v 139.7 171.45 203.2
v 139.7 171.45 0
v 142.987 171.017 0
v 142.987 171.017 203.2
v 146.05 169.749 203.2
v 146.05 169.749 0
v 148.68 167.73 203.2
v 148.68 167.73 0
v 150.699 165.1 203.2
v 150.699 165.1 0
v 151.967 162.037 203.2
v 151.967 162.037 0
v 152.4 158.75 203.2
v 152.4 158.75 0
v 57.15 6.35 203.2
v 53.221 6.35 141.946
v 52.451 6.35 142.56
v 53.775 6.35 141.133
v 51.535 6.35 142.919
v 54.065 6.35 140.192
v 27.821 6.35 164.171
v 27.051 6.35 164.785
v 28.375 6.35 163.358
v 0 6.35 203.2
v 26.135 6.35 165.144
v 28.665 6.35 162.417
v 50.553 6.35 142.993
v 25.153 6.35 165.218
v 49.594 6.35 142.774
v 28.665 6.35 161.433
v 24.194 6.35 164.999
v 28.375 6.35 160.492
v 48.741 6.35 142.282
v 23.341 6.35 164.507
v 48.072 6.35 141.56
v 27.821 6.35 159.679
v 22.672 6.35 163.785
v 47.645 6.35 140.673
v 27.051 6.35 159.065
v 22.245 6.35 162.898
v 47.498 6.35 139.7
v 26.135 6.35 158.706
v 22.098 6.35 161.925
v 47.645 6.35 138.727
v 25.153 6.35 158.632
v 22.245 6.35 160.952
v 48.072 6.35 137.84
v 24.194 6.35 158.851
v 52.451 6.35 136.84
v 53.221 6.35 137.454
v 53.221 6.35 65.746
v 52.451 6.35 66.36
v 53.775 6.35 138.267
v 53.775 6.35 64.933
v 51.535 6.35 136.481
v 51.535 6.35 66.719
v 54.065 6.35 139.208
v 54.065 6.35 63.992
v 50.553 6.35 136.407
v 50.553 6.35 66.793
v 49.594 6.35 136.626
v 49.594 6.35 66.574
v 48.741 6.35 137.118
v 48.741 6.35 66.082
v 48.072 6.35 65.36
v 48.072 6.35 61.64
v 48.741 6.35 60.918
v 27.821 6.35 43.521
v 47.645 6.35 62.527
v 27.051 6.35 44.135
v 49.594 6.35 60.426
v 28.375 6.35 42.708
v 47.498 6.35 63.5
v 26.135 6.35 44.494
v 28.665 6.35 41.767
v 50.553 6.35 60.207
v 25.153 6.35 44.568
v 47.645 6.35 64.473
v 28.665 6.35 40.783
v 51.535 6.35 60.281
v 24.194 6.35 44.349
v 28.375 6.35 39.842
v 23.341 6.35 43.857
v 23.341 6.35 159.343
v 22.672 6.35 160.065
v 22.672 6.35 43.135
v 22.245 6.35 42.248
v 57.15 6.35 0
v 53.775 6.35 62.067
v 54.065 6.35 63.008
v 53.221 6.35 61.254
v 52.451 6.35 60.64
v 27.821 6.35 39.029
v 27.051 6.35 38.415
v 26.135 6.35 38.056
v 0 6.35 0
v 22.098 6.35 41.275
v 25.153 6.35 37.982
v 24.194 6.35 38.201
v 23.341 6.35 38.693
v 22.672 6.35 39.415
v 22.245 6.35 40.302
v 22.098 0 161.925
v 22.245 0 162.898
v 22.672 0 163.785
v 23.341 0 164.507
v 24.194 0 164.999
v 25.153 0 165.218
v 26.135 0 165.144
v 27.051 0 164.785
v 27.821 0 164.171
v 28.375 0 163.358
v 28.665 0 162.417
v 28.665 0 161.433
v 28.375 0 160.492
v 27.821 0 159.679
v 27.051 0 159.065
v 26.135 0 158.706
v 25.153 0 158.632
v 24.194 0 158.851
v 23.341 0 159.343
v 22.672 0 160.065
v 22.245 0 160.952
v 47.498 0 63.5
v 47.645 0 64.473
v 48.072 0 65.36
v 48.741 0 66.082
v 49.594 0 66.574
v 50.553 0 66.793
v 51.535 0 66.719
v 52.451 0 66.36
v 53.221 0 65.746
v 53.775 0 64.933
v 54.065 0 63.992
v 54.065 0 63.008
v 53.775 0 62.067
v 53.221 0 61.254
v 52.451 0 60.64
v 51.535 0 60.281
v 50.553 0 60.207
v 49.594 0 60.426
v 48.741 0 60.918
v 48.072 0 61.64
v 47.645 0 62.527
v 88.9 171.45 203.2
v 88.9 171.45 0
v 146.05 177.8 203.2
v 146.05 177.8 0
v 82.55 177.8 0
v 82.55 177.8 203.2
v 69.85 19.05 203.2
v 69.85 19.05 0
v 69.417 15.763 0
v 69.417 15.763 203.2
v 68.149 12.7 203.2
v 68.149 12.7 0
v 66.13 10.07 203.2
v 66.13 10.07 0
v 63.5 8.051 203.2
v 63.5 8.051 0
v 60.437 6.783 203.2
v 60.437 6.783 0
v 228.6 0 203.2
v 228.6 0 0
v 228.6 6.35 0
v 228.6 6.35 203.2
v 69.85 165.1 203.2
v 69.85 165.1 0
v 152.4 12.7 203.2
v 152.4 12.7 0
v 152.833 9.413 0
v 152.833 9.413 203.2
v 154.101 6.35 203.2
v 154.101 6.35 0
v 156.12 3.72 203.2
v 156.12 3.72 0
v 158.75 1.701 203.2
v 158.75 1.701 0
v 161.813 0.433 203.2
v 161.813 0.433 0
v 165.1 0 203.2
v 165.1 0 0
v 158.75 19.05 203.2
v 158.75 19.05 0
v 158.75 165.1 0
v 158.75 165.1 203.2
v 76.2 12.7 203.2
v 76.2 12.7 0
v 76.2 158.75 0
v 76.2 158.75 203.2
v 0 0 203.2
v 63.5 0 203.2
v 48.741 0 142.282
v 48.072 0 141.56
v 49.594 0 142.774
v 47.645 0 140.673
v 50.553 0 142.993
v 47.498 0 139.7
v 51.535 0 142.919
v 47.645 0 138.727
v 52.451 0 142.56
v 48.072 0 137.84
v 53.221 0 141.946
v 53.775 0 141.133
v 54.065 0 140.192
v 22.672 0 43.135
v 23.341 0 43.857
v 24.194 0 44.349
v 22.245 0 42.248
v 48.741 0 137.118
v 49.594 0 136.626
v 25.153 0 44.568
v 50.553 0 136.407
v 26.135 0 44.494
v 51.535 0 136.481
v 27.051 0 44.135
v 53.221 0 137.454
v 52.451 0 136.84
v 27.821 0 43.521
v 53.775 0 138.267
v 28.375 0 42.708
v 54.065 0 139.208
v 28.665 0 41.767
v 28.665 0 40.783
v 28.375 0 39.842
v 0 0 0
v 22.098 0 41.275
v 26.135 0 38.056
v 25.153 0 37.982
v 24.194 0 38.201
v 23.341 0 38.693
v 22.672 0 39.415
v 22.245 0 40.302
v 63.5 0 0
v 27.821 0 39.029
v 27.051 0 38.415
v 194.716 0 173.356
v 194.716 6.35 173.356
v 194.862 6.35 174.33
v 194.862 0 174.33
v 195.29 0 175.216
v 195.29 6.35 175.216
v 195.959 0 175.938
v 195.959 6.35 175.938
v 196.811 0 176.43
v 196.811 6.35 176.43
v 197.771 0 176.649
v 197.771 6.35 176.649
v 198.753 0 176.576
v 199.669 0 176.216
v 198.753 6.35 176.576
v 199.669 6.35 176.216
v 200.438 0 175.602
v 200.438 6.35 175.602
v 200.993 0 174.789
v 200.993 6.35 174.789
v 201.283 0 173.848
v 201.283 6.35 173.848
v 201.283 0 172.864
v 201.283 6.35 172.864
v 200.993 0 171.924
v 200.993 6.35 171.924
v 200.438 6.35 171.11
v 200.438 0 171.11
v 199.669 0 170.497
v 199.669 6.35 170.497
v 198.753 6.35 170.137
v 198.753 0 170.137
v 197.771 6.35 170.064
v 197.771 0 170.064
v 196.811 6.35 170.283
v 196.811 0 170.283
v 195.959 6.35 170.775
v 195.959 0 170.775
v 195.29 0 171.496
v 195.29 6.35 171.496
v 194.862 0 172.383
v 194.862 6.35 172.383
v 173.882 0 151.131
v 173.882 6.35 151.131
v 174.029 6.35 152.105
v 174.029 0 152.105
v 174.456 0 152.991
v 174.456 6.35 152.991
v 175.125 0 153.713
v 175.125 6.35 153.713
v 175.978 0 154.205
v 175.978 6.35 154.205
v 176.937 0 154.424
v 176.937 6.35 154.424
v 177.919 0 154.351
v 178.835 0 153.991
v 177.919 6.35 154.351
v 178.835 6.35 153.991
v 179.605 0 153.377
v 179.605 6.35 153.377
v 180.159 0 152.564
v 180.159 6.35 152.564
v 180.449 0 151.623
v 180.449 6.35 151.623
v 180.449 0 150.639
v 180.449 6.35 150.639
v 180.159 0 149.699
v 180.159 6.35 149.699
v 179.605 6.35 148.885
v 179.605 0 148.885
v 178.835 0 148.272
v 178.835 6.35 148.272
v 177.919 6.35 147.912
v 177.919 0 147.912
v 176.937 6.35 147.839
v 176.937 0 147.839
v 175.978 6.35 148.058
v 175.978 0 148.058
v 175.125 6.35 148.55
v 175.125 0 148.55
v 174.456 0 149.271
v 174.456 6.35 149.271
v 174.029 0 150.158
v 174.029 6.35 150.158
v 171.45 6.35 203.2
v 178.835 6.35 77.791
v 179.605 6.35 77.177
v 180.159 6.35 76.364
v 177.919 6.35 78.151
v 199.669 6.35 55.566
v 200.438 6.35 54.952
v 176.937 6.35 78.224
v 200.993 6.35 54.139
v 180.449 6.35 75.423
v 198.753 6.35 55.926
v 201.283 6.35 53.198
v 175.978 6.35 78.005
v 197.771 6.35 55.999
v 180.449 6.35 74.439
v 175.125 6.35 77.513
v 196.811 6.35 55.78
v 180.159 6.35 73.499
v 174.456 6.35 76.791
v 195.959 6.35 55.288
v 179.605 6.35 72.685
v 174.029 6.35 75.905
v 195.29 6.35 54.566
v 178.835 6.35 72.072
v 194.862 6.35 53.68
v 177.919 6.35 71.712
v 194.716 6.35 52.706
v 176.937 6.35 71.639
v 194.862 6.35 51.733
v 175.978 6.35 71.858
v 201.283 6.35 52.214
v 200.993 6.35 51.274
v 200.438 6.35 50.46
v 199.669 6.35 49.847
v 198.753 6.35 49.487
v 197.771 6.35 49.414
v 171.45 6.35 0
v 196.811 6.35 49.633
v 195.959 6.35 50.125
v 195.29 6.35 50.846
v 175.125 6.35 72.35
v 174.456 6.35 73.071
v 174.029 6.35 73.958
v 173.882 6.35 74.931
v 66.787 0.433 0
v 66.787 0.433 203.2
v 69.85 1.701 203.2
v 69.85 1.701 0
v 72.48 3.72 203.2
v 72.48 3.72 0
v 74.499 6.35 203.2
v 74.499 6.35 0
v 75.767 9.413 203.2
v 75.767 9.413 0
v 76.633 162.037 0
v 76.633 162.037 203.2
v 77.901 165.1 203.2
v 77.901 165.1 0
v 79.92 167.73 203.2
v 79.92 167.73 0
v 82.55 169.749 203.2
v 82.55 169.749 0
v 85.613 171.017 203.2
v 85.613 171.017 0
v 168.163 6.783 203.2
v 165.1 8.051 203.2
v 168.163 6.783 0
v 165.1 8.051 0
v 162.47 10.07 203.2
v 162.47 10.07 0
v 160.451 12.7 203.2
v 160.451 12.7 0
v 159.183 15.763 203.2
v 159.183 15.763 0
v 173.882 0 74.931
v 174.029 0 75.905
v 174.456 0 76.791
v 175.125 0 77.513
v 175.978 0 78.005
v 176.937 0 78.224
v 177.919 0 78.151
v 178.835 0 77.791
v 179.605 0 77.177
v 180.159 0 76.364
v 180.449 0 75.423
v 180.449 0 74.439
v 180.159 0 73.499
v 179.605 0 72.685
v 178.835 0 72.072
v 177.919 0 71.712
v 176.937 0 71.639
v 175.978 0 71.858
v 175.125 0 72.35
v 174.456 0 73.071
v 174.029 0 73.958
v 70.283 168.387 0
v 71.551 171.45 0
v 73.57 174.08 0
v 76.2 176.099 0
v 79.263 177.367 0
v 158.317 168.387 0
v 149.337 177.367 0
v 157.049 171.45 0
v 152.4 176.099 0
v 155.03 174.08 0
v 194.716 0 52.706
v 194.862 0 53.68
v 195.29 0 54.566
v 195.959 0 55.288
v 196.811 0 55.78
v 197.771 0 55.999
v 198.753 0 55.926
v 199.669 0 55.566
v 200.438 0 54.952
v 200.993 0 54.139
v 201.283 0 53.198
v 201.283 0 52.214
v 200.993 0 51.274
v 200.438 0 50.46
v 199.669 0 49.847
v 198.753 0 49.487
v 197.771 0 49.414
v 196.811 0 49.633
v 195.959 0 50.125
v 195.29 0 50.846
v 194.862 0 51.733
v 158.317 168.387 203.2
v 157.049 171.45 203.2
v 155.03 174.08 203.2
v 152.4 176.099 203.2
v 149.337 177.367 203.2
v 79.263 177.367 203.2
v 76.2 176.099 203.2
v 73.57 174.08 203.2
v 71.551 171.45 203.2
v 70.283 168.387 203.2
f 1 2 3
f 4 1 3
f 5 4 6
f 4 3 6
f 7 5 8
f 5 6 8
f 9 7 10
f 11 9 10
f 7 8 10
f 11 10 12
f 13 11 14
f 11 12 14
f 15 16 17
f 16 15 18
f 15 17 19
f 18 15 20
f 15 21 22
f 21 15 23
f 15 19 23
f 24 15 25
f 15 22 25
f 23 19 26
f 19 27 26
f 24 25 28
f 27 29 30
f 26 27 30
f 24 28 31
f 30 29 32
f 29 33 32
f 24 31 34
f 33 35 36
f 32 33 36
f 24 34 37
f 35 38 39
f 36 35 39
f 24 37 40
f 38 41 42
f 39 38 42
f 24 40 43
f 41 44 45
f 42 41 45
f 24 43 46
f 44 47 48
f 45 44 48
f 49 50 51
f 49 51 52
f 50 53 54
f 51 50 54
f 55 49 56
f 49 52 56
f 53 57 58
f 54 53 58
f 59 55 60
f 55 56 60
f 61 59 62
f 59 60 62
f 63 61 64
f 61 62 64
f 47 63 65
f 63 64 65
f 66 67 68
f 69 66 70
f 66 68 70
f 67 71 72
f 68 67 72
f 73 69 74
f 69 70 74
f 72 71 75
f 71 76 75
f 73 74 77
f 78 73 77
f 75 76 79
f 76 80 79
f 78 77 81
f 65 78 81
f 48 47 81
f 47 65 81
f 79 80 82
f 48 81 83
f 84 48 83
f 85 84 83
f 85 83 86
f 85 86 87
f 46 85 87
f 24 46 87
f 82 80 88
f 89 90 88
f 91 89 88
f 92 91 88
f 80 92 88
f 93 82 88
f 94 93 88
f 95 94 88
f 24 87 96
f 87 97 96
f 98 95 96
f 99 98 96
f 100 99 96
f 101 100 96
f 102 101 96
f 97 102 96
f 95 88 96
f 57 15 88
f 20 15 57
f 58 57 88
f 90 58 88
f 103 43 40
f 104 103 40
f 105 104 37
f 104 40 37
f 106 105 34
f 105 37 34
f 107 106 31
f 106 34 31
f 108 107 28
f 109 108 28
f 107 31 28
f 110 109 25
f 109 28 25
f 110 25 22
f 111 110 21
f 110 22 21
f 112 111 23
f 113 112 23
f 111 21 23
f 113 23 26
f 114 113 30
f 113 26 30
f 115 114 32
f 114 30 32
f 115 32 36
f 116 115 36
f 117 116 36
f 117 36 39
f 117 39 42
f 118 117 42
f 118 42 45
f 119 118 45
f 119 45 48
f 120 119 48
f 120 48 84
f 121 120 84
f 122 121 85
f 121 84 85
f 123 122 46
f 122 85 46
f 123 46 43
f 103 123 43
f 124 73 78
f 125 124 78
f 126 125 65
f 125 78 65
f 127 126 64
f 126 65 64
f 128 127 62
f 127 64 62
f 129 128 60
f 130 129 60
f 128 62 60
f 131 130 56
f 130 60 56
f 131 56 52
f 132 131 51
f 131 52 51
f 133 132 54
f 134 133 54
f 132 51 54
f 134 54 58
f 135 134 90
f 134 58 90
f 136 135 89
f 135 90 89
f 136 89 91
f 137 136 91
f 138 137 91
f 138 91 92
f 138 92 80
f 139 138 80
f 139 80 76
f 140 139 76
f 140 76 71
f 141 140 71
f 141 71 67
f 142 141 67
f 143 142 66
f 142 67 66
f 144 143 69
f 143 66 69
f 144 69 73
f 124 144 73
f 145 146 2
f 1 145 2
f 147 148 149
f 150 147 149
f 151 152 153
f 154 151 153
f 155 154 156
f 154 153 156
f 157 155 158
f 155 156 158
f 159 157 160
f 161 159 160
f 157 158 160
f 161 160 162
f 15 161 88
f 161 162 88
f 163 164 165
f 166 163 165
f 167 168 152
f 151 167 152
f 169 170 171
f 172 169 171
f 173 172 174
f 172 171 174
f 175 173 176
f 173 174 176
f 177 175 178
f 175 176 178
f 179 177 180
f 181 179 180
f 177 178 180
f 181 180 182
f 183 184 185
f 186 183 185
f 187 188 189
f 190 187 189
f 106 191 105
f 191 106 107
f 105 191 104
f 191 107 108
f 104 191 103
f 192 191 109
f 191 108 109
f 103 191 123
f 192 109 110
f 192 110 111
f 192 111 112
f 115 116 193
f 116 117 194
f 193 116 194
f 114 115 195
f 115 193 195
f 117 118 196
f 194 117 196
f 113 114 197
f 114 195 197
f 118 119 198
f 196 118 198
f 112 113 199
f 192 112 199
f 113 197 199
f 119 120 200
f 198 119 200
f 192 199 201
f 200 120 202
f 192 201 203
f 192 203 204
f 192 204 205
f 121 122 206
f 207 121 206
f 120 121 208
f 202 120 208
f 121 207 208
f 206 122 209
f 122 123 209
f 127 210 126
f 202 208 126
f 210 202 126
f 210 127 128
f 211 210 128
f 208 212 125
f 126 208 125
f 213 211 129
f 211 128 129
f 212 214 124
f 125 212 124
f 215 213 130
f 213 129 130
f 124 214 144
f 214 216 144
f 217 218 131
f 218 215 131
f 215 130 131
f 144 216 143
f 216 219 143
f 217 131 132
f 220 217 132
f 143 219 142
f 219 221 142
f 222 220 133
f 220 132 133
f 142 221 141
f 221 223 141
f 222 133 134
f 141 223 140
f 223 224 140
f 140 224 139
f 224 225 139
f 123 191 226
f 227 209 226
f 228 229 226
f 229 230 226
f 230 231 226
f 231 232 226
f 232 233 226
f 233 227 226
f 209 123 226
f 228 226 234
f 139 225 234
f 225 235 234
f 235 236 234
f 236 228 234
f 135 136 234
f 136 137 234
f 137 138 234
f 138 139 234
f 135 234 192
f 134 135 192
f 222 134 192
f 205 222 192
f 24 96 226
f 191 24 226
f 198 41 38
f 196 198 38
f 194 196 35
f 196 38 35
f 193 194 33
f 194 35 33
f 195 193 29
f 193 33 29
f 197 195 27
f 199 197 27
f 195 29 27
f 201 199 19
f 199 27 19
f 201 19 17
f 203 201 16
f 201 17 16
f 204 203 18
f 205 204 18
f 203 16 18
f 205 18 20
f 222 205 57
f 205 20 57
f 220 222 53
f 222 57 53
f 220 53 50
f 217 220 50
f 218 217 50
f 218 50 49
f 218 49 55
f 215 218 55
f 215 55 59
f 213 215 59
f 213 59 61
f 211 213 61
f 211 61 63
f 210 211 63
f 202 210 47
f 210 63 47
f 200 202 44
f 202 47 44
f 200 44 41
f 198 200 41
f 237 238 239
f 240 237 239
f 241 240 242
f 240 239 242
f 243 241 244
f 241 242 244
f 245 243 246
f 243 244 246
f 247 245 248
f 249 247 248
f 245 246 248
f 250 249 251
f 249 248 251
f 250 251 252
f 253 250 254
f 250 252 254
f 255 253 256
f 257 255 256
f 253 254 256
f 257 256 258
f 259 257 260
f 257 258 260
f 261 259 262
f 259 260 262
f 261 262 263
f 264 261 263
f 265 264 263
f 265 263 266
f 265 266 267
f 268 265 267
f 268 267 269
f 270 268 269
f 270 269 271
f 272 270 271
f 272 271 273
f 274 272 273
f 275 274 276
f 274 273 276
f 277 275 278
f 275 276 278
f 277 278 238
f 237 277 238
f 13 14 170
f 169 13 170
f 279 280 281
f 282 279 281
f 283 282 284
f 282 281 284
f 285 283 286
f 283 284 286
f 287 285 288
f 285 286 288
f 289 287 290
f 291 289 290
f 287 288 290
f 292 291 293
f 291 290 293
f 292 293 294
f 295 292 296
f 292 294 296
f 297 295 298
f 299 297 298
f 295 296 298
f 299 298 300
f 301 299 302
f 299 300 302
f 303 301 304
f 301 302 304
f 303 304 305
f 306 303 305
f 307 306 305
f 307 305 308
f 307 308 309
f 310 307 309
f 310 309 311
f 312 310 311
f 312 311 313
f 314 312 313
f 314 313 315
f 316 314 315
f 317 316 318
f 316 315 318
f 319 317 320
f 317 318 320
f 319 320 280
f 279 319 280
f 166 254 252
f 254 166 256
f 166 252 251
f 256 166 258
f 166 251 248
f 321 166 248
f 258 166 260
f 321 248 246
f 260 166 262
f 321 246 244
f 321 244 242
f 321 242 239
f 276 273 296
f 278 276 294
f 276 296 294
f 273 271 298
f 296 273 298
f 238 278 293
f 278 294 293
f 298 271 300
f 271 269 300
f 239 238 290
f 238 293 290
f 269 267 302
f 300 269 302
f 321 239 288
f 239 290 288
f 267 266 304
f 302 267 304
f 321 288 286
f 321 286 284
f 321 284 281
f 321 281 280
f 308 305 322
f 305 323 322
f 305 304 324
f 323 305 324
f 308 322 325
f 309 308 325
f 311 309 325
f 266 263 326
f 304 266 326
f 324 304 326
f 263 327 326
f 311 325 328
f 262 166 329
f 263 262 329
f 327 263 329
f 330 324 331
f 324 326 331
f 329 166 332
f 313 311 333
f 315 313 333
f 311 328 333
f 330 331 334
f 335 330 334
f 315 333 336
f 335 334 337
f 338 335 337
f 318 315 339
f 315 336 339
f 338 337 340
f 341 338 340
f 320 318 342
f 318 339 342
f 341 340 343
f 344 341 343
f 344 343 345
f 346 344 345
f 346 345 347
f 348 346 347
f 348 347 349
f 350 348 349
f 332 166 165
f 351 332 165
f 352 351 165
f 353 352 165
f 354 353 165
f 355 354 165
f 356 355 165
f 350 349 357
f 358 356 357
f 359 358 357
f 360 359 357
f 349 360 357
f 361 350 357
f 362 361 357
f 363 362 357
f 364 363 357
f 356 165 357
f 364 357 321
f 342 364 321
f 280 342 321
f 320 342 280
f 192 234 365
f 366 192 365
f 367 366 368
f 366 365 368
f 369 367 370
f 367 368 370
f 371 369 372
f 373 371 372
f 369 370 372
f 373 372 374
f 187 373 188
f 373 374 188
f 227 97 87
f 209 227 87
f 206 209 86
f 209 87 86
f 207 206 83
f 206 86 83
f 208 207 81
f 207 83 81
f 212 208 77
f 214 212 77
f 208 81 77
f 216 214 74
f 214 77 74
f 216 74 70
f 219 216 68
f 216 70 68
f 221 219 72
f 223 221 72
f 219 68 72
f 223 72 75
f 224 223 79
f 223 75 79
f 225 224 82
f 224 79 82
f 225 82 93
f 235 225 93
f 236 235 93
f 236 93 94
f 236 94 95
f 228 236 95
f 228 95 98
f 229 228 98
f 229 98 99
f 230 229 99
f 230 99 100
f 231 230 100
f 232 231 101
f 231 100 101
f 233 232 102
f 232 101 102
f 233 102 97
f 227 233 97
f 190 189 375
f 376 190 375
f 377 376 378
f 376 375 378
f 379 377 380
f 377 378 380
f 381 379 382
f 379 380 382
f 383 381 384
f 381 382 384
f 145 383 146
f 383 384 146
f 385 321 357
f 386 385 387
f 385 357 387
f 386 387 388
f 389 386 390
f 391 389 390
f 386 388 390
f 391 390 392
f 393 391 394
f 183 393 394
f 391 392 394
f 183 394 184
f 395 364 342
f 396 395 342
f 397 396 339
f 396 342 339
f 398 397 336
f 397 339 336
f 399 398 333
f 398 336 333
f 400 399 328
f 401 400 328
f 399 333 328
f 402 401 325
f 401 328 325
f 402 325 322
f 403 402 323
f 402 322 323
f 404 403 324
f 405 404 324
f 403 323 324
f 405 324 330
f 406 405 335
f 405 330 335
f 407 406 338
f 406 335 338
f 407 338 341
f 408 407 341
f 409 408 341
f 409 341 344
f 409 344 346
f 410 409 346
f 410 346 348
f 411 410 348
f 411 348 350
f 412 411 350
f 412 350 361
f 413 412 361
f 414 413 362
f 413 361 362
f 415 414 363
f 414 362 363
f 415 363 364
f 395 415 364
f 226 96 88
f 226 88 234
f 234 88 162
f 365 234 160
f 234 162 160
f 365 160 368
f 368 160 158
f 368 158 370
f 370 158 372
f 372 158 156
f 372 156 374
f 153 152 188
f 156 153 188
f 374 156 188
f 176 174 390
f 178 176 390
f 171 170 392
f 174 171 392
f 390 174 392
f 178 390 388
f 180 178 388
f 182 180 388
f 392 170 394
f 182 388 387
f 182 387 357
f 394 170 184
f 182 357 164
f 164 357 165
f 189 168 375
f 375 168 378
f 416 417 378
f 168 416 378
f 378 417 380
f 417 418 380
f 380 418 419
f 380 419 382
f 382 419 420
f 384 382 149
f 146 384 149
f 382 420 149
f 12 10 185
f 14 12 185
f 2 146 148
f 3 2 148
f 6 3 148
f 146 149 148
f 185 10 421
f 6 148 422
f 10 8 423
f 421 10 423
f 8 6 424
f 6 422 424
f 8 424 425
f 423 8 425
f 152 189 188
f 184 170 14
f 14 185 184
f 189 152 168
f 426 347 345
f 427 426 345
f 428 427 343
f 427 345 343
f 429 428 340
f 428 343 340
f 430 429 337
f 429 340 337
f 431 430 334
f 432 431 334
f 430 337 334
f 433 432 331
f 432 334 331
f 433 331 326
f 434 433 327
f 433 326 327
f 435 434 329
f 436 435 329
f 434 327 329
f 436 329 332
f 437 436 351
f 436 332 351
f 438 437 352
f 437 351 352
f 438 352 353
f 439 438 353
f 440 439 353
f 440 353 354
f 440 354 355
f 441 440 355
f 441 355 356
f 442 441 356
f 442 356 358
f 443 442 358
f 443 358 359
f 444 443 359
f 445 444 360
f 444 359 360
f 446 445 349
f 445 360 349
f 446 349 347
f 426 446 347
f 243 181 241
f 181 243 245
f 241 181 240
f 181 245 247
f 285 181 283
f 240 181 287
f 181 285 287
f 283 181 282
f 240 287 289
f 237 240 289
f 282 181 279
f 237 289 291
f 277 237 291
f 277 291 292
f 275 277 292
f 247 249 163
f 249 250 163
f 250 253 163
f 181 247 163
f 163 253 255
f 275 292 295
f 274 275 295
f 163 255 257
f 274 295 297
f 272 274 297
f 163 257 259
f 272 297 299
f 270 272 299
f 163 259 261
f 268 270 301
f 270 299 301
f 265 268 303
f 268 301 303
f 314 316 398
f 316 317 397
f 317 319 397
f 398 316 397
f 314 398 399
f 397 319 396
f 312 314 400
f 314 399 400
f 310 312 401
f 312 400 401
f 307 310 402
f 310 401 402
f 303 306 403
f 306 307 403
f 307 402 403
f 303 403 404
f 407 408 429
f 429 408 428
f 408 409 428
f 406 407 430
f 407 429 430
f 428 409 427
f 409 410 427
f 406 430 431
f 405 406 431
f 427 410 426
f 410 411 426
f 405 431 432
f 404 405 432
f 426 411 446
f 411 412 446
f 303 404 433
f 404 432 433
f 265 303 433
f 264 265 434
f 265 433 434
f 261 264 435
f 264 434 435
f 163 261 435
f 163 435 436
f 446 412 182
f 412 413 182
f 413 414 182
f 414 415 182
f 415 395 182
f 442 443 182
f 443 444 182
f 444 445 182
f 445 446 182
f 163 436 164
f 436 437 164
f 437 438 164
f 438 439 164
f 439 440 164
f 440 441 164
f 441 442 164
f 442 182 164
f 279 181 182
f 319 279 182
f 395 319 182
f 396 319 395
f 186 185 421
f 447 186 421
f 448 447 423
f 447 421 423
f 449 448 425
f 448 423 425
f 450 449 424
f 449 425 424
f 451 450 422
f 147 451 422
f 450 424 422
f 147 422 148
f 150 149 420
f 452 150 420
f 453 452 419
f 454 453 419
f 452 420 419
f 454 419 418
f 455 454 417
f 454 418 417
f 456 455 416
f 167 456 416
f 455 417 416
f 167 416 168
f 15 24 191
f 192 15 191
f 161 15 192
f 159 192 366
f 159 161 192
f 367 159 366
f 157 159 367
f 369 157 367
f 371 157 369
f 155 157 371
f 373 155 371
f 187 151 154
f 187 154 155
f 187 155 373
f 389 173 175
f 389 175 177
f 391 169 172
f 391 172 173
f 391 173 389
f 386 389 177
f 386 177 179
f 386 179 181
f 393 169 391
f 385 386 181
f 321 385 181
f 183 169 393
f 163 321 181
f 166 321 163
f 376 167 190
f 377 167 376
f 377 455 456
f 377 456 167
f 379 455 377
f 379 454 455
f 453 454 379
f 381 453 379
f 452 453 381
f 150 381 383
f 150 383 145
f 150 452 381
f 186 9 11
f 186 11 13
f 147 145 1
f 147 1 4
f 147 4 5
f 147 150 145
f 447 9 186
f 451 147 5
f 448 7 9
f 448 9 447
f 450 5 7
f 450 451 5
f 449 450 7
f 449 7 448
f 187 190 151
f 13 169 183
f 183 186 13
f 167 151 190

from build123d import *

# Parameters (mm, degrees)
EXTRUDE1_DEPTH     = 203.2
SKETCH3_R          = 3.302
CUT_EXTRUDE1_DEPTH = 6.35
SKETCH4_R          = 3.302
CUT_EXTRUDE2_DEPTH = 6.35


with BuildPart() as part:
    # Sketch1 → Extrude1 (new body)
    with BuildSketch(Plane.XY):
        with BuildLine():
            Line((0, 0), (63.5, 0))
            ThreePointArc((63.5, 0), (72.480256121, 3.719743879), (76.2, 12.7))
            Line((76.2, 12.7), (76.2, 158.75))
            ThreePointArc((76.2, 158.75), (79.919743879, 167.730256121), (88.9, 171.45))
            Line((88.9, 171.45), (139.7, 171.45))
            ThreePointArc((139.7, 171.45), (148.680256121, 167.730256121), (152.4, 158.75))
            Line((152.4, 158.75), (152.4, 12.7))
            ThreePointArc((152.4, 12.7), (156.119743879, 3.719743879), (165.1, 0))
            Line((165.1, 0), (228.6, 0))
            Line((228.6, 0), (228.6, 0.133258461))
            Line((228.6, 0.133258461), (228.6, 6.35))
            Line((228.6, 6.35), (171.45, 6.35))
            ThreePointArc((171.45, 6.35), (162.469743879, 10.069743879), (158.75, 19.05))
            Line((158.75, 19.05), (158.75, 165.1))
            ThreePointArc((158.75, 165.1), (155.030256121, 174.080256121), (146.05, 177.8))
            Line((146.05, 177.8), (82.55, 177.8))
            ThreePointArc((82.55, 177.8), (73.569743879, 174.080256121), (69.85, 165.1))
            Line((69.85, 165.1), (69.85, 19.05))
            ThreePointArc((69.85, 19.05), (66.130256121, 10.069743879), (57.15, 6.35))
            Line((57.15, 6.35), (0, 6.35))
            Line((0, 6.35), (0, 0))
        make_face()
    extrude(amount=EXTRUDE1_DEPTH)

    # Sketch3 → Cut-Extrude1 (cut)
    with BuildSketch(Plane(origin=(0, 6.35, 0), x_dir=(-1, 0, 0), z_dir=(0, 1, 0))):
        with Locations((-25.4, 41.275)):
            Circle(SKETCH3_R)
        with Locations((-50.8, 63.5)):
            Circle(SKETCH3_R)
        with Locations((-25.4, 161.925)):
            Circle(SKETCH3_R)
        with Locations((-50.8, 139.7)):
            Circle(SKETCH3_R)
    extrude(amount=-CUT_EXTRUDE1_DEPTH, mode=Mode.SUBTRACT)

    # Sketch4 → Cut-Extrude2 (cut)
    with BuildSketch(Plane(origin=(0, 6.35, 0), x_dir=(-1, 0, 0), z_dir=(0, 1, 0))):
        with Locations((-177.183969253, 74.931336249)):
            Circle(SKETCH4_R)
        with Locations((-177.183969253, 151.131336249)):
            Circle(SKETCH4_R)
        with Locations((-198.01776745, 52.706336249)):
            Circle(SKETCH4_R)
        with Locations((-198.01776745, 173.356336249)):
            Circle(SKETCH4_R)
    extrude(amount=-CUT_EXTRUDE2_DEPTH, mode=Mode.SUBTRACT)


solid = part.part
